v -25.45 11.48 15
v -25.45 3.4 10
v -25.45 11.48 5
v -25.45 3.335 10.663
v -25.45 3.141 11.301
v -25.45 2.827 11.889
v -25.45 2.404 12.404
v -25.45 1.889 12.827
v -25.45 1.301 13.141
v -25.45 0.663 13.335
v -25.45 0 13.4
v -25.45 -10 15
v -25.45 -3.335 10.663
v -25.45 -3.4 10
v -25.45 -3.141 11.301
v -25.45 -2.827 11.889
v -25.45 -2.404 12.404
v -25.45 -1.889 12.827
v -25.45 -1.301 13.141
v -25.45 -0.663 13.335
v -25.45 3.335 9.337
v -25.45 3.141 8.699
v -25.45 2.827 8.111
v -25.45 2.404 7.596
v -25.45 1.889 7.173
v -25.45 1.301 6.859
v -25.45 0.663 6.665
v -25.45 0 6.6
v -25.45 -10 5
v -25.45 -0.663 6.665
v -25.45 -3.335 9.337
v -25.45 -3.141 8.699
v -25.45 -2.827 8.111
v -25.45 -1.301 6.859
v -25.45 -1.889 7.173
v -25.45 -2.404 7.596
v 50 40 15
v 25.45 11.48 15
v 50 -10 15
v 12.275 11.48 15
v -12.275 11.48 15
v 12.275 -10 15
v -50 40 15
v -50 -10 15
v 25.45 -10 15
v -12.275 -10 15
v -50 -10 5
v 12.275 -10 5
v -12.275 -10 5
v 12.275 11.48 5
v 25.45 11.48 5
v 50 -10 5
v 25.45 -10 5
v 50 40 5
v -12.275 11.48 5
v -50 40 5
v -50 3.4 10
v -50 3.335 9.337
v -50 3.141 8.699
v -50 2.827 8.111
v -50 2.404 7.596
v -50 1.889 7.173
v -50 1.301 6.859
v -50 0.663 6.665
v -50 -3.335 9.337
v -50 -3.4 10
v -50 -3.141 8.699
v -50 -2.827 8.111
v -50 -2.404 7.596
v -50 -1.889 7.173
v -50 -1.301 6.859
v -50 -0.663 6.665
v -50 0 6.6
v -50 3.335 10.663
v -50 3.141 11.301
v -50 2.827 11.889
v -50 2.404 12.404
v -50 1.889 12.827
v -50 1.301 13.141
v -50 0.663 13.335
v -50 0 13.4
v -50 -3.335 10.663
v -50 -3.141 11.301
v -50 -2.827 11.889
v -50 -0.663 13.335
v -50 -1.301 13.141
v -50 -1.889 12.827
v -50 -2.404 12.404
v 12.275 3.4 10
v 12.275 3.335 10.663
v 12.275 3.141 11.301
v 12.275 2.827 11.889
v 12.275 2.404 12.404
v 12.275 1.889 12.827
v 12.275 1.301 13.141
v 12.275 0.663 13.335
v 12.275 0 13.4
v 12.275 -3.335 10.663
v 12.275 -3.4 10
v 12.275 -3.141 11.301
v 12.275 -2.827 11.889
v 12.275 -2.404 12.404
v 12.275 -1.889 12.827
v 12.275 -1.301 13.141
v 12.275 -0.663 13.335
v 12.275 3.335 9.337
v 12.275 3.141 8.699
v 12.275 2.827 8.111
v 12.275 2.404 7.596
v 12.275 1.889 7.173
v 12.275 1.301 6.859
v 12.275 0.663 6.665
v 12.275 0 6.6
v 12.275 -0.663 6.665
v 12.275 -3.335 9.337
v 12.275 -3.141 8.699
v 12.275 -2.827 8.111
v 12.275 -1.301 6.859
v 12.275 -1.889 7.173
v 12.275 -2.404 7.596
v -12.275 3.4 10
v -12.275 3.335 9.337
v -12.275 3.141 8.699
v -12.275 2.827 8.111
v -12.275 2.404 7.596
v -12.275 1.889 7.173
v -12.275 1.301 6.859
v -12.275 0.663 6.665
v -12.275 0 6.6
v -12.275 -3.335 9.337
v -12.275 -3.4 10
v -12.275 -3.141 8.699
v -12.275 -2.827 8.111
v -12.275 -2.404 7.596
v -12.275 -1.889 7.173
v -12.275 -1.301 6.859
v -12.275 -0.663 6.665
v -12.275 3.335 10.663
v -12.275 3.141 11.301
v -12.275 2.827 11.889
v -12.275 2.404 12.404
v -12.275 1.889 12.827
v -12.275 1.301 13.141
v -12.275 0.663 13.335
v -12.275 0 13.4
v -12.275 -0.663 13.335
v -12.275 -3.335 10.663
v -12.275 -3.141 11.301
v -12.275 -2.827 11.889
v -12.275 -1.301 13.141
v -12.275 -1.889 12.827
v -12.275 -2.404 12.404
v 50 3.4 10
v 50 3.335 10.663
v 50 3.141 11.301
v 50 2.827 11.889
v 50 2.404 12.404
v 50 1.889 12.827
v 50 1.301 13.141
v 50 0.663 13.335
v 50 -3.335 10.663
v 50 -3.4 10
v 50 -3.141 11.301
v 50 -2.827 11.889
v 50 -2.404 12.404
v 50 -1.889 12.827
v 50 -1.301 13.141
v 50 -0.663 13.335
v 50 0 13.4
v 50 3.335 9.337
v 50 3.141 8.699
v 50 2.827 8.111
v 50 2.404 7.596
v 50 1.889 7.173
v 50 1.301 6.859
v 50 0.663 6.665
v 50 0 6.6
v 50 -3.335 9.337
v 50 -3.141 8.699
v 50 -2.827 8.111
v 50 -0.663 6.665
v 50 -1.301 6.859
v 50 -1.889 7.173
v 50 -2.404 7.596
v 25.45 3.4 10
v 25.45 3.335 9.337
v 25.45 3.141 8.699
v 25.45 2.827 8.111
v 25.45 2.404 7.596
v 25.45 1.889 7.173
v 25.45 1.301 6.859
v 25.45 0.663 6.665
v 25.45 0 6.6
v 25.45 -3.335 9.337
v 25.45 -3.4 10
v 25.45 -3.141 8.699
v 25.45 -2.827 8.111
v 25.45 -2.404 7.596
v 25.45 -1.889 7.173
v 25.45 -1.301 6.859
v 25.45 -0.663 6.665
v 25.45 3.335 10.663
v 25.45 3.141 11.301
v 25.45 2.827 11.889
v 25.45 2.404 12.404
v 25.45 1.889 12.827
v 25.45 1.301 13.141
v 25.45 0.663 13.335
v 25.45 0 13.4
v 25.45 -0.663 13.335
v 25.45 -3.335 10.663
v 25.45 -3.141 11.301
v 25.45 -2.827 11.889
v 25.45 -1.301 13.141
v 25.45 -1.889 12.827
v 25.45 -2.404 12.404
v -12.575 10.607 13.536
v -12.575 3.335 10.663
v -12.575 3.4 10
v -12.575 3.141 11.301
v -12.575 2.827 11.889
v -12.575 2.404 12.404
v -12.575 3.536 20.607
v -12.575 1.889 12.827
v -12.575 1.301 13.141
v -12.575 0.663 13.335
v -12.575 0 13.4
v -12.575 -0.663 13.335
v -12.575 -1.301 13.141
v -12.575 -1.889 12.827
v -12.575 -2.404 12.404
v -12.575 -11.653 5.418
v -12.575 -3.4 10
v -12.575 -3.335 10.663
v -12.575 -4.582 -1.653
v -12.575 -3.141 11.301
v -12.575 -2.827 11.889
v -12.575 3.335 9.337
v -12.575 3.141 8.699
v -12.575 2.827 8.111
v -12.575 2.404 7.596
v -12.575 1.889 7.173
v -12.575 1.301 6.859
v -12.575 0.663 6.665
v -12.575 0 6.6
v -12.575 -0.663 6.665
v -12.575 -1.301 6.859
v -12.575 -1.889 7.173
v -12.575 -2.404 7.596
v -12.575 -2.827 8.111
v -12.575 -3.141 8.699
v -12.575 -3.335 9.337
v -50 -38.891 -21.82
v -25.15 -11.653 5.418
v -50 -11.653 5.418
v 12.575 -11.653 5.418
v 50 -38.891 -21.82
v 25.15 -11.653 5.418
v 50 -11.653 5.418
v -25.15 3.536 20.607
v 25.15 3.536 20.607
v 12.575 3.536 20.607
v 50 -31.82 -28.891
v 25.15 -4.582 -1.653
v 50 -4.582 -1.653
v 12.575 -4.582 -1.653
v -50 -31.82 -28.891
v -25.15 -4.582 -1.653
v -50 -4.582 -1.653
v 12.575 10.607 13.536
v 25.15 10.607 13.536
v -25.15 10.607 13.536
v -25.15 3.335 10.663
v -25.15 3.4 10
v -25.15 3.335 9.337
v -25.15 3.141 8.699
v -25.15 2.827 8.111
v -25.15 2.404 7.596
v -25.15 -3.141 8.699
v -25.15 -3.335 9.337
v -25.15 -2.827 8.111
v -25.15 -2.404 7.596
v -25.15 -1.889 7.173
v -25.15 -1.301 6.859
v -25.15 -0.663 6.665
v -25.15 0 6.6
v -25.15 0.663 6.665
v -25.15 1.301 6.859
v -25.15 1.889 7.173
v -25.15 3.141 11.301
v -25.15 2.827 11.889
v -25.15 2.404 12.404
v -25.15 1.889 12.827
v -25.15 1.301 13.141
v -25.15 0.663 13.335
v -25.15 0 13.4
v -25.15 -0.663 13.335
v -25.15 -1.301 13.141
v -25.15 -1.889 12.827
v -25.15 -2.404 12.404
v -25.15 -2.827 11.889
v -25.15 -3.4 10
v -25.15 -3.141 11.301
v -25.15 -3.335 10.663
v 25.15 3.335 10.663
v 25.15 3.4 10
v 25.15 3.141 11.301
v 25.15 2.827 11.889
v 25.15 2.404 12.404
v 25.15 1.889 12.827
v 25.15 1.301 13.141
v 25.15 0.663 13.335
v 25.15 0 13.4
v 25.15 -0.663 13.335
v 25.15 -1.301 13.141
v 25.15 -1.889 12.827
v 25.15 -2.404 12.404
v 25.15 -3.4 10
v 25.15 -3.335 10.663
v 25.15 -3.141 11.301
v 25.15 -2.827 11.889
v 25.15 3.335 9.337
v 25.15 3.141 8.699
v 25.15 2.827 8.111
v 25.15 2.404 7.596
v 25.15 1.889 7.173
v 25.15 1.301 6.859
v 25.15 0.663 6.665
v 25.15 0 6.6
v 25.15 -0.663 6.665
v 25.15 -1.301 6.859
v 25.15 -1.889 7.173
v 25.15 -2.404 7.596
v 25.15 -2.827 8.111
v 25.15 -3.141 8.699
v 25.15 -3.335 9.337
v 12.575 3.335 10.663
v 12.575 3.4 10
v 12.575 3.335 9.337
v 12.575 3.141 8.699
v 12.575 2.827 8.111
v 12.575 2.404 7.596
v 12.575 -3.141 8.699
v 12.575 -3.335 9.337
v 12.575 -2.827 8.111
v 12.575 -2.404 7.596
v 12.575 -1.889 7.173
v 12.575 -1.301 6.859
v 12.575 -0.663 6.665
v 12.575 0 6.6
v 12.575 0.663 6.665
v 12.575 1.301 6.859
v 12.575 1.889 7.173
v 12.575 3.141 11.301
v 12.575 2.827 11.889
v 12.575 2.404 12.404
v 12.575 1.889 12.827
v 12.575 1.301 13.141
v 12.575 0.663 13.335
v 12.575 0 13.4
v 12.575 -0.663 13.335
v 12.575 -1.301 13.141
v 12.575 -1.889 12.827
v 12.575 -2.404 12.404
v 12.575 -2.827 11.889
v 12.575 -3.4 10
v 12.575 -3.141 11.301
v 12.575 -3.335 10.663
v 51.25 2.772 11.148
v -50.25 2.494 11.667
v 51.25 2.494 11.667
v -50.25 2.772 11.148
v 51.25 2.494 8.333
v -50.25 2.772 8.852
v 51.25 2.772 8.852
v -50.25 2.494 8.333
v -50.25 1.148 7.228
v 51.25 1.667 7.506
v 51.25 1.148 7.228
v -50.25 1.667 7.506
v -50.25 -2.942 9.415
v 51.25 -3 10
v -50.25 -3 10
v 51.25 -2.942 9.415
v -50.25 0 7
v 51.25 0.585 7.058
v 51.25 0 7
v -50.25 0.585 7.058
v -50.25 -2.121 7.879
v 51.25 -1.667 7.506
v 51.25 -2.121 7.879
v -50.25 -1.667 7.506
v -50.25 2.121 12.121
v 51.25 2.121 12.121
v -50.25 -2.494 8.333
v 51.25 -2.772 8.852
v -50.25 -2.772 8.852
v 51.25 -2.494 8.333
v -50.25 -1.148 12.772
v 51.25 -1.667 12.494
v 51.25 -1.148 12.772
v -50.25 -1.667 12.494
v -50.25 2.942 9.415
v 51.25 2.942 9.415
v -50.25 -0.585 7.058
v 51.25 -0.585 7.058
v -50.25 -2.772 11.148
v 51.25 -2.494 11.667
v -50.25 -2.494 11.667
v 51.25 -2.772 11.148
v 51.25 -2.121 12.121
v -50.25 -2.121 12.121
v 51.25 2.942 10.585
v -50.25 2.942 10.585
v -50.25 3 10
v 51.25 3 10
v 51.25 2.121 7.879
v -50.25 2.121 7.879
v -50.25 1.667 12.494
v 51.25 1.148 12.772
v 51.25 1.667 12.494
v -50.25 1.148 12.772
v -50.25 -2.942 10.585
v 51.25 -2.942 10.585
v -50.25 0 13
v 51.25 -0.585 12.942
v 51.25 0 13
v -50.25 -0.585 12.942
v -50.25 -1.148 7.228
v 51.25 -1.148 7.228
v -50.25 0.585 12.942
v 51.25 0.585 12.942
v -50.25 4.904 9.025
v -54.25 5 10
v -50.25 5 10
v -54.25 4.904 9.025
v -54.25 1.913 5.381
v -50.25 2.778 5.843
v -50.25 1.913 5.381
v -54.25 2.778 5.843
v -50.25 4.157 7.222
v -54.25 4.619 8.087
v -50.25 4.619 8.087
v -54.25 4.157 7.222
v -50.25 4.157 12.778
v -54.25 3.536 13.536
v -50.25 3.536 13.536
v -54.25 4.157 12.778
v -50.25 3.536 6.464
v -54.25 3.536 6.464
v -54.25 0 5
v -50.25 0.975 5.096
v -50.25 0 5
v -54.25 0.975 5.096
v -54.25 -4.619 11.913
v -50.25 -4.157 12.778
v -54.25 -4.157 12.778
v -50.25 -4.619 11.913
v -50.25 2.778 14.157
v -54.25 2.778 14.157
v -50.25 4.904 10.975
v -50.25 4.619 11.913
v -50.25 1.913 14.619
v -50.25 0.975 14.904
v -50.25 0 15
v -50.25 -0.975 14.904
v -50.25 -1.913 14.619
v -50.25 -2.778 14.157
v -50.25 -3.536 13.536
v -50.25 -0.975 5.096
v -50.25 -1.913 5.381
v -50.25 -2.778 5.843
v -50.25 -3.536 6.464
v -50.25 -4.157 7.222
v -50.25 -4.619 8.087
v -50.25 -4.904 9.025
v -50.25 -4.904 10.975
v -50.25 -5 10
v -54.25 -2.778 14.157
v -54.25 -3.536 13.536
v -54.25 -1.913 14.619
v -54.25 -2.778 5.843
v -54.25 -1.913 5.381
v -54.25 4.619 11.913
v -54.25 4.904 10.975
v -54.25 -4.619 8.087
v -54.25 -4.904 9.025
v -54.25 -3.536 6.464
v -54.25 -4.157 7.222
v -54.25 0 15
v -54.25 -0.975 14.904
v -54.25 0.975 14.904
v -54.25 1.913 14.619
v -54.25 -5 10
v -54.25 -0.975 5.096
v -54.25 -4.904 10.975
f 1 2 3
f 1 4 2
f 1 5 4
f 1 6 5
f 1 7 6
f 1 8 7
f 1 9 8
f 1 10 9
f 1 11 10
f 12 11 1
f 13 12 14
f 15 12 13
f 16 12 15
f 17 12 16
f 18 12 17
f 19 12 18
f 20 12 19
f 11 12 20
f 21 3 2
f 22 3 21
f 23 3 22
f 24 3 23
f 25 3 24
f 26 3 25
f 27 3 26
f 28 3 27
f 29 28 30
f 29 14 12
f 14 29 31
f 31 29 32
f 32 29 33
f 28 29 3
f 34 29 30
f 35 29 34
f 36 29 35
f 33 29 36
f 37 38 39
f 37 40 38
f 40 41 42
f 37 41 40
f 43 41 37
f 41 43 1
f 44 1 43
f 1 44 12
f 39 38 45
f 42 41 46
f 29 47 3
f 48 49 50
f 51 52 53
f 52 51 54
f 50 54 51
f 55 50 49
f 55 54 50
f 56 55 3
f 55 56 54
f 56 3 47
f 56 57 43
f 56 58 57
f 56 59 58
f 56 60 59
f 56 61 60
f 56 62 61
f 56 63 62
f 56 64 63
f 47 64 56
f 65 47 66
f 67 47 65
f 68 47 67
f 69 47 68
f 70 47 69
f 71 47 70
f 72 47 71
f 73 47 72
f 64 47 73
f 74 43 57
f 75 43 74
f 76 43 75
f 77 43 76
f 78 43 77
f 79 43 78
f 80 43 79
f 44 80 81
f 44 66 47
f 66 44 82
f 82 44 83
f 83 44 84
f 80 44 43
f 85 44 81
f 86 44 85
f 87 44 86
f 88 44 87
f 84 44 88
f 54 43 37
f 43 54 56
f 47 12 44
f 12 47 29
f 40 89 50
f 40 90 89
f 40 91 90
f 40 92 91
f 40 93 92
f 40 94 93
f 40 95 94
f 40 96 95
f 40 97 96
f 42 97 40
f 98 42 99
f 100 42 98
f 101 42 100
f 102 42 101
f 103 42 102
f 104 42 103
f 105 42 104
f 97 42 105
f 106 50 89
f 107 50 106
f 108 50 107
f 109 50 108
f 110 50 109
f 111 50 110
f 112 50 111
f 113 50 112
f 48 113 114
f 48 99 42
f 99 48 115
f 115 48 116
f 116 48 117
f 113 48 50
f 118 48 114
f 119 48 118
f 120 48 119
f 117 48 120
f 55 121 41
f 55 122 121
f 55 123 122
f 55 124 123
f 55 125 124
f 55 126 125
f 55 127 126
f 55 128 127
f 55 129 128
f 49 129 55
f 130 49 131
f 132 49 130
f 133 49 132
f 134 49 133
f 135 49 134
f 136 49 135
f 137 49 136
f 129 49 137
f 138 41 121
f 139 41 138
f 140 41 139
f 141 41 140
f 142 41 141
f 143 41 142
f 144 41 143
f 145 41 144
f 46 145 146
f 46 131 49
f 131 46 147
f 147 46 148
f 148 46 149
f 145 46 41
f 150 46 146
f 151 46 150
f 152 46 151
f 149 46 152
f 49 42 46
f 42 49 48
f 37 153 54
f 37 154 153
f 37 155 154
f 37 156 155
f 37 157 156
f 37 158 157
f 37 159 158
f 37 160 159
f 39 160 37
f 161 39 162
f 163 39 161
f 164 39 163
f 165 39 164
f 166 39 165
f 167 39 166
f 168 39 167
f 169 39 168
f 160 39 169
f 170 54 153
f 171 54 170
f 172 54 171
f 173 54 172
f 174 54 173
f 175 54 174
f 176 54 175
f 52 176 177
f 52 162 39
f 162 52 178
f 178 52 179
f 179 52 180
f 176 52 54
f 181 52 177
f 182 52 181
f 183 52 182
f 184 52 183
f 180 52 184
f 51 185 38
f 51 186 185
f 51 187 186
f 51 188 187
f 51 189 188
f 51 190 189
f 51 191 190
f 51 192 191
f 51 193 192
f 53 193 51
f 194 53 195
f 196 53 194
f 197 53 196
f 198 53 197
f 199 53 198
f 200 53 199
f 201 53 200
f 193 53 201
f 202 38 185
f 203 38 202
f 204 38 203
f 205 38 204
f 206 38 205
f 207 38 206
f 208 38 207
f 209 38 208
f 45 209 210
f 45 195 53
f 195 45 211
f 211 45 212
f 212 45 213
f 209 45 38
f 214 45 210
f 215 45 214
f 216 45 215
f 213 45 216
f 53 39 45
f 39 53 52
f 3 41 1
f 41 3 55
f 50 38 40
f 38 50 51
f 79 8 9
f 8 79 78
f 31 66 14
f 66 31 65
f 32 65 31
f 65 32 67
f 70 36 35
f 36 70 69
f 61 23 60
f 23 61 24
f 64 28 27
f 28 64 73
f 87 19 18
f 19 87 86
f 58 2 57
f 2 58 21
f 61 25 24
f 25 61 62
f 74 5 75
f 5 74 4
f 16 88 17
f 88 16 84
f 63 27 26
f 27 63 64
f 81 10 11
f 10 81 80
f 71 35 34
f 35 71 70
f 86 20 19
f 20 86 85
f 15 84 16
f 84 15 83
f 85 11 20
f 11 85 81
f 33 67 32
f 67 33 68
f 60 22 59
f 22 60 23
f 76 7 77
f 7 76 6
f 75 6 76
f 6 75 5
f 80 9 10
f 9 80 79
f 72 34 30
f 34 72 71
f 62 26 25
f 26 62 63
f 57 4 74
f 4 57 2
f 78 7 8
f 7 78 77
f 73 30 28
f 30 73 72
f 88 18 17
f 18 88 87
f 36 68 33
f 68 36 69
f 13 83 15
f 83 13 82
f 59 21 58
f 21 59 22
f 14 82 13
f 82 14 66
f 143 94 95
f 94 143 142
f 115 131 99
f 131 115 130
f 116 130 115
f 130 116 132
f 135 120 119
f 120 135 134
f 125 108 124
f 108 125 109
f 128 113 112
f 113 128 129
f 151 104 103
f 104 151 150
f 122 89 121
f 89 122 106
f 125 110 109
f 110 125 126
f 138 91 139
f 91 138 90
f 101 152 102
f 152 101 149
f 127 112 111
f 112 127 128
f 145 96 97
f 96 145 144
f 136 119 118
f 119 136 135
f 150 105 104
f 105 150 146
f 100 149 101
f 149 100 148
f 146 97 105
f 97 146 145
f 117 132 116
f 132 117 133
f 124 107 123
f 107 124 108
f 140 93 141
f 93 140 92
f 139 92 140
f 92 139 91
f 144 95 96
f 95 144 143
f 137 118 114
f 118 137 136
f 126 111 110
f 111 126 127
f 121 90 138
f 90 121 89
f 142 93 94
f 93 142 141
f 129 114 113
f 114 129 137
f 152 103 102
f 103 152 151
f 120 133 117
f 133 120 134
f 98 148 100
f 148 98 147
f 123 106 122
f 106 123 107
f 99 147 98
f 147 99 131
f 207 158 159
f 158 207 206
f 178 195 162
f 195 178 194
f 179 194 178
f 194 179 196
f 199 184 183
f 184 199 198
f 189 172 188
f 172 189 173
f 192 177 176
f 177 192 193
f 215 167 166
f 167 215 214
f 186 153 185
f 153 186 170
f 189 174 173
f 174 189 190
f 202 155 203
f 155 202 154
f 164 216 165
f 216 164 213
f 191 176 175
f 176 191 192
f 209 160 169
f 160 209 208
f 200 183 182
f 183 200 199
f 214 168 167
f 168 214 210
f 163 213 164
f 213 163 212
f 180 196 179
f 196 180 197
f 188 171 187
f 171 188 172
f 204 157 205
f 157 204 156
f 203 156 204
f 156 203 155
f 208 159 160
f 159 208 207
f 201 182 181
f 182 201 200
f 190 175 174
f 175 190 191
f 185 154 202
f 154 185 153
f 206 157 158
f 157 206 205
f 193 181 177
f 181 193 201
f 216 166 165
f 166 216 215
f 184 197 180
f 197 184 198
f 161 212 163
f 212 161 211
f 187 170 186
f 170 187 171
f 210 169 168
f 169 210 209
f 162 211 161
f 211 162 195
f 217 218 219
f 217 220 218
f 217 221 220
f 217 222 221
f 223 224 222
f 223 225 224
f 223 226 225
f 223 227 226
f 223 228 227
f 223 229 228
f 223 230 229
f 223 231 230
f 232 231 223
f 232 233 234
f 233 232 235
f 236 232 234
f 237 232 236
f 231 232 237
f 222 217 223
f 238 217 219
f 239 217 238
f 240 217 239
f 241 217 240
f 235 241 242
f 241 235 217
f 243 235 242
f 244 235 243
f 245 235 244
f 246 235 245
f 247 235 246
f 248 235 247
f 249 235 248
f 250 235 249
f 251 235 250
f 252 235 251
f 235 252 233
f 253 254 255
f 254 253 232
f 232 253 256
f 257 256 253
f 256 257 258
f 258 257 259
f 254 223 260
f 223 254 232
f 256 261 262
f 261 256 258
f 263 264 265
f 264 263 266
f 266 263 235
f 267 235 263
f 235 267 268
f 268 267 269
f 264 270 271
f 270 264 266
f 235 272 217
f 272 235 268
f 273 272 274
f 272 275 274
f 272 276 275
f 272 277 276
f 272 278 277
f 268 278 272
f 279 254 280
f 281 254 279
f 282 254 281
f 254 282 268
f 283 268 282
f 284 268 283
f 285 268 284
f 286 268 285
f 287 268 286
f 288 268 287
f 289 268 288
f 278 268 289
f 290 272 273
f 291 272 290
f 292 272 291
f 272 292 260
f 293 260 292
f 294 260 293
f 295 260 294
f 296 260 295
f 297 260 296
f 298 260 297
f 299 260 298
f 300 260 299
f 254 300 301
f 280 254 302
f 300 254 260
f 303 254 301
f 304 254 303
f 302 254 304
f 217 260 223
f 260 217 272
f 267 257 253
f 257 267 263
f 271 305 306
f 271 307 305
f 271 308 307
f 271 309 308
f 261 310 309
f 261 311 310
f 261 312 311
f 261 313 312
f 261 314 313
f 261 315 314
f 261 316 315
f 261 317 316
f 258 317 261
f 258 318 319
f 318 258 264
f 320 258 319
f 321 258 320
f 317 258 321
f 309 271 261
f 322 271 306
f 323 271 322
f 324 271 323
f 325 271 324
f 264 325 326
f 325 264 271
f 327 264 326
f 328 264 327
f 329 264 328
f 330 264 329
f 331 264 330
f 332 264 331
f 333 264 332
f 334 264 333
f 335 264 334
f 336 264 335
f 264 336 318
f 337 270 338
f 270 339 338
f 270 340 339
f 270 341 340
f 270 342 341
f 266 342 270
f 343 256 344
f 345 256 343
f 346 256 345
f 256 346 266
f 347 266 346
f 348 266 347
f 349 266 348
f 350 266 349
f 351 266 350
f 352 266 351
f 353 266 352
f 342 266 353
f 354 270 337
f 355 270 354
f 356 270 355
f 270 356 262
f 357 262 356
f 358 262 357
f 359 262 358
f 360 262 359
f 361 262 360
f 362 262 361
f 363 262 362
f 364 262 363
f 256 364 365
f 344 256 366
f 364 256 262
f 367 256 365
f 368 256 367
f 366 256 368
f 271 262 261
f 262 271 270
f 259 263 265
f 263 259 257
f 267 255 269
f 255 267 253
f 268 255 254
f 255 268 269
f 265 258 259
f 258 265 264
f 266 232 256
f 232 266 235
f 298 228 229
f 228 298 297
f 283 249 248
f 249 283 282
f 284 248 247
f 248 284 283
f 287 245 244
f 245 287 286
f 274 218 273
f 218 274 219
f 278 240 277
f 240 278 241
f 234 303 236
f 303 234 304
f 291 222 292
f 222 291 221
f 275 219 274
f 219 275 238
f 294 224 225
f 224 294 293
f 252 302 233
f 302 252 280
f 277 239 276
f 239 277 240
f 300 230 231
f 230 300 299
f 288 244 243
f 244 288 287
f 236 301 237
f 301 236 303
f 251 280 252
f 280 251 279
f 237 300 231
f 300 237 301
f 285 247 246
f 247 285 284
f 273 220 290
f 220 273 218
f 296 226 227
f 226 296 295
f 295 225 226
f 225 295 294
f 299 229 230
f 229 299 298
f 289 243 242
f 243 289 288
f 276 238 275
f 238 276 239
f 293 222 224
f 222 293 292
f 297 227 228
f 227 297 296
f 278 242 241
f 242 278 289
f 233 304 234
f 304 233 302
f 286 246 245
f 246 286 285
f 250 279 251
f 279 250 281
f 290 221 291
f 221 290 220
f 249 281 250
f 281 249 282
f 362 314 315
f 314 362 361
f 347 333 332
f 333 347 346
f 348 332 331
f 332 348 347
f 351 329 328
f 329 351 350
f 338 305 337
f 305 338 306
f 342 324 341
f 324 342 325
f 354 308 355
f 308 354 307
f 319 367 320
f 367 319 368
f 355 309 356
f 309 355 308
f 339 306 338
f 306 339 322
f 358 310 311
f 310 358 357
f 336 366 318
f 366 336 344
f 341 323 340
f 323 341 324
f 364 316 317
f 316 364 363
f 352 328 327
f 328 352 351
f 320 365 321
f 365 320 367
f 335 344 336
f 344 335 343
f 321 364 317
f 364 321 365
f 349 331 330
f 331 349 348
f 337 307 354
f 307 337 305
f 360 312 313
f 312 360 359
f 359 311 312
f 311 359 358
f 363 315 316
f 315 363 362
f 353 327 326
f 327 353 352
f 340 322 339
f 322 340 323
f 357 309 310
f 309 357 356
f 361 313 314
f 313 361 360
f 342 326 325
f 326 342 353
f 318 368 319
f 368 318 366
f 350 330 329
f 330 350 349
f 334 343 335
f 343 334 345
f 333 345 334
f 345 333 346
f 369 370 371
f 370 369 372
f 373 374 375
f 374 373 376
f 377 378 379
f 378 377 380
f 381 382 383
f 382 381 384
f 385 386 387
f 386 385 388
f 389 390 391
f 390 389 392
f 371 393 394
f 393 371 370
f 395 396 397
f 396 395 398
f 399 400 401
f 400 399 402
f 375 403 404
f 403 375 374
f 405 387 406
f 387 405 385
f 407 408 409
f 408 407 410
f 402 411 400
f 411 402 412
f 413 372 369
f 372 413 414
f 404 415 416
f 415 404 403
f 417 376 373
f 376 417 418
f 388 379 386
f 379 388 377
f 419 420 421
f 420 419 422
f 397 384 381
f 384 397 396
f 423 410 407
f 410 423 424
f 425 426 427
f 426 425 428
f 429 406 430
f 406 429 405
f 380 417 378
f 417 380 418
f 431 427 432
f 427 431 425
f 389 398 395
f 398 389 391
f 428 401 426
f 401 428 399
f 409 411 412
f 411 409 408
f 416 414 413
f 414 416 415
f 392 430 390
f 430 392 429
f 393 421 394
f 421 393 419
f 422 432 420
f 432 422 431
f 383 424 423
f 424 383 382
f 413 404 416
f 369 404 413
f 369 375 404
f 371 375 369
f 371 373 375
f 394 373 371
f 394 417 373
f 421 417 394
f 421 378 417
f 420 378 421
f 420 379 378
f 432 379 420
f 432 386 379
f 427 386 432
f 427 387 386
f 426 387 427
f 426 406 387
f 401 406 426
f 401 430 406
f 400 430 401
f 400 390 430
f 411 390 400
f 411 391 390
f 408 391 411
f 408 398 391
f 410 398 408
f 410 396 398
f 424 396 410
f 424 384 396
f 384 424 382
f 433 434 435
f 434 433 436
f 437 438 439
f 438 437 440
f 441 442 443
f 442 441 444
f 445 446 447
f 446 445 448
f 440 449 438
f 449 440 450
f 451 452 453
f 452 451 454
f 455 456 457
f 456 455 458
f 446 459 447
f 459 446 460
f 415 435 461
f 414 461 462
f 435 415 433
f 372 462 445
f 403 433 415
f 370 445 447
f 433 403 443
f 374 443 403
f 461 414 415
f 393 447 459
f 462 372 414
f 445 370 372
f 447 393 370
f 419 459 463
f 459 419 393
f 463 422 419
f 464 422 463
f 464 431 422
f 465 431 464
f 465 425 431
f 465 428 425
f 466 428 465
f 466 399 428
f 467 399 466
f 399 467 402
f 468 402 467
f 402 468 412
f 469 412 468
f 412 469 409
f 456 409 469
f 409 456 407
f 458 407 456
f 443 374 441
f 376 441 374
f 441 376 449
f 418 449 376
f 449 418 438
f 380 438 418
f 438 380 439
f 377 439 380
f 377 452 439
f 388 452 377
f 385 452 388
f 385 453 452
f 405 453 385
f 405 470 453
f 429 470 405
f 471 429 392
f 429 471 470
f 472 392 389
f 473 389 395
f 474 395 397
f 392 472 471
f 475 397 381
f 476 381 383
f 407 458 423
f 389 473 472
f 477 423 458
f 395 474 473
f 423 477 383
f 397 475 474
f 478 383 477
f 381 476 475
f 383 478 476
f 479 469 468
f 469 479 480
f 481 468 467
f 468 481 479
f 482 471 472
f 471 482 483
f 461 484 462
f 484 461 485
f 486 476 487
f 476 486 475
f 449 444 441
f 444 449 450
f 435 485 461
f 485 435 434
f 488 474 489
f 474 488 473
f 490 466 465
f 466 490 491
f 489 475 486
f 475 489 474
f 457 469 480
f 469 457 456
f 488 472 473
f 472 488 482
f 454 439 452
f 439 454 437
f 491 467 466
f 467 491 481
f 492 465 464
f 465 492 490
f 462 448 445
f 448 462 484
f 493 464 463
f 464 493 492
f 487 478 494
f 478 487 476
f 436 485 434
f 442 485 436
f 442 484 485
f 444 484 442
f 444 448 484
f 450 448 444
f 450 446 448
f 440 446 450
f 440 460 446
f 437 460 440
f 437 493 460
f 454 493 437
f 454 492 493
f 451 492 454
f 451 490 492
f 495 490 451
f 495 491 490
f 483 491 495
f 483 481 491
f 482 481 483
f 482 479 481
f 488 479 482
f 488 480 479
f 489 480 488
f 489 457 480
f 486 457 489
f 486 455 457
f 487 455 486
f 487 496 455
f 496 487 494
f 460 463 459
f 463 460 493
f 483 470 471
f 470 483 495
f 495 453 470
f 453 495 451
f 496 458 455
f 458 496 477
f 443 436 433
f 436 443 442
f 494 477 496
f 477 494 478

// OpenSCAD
$fn = 32;

// ------------------------------------------------------------------------
// Butt hinge: hinge 100 mm, leaf swung 45 deg
// Every part is its own module, assembly() places every instance.
// ------------------------------------------------------------------------

// --- part 1 ---
module hinge_base() {
  difference() {
    union() {
      translate([-50, -10, -5]) cube([24.55, 50, 10]);
      translate([-12.275, -10, -5]) cube([24.55, 50, 10]);
      translate([25.45, -10, -5]) cube([24.55, 50, 10]);
      translate([-50, 11.48, -5]) cube([100, 28.52, 10]);
    }
    translate([-37.725, 0, 0]) rotate([0, 90, 0]) cylinder(h = 26.55, d = 6.8, center = true);
    translate([0, 0, 0]) rotate([0, 90, 0]) cylinder(h = 26.55, d = 6.8, center = true);
    translate([37.725, 0, 0]) rotate([0, 90, 0]) cylinder(h = 26.55, d = 6.8, center = true);
  }
}

// --- part 2 ---
module hinge_mover() {
  difference() {
    union() {
      translate([-25.15, -50, -5]) cube([12.575, 60, 10]);
      translate([12.575, -50, -5]) cube([12.575, 60, 10]);
      translate([-50, -50, -5]) cube([100, 38.52, 10]);
    }
    translate([-18.863, 0, 0]) rotate([0, 90, 0]) cylinder(h = 14.575, d = 6.8, center = true);
    translate([18.863, 0, 0]) rotate([0, 90, 0]) cylinder(h = 14.575, d = 6.8, center = true);
  }
}

// --- part 3 ---
module hinge_pin() {
  rotate([0, 90, 0]) cylinder(h = 102.5, d = 6, center = true);
  translate([-54.25, 0, 0]) rotate([0, 90, 0]) cylinder(h = 4, d = 10);
}

// --- assembly ---
module assembly() {
  color([0.80, 0.24, 0.20]) translate([0, 0, 10]) rotate([0, 0, 0]) hinge_base();
  color([0.20, 0.45, 0.75]) translate([0, 0, 10]) rotate([45, 0, 0]) hinge_mover();
  color([0.25, 0.62, 0.32]) translate([0, 0, 10]) rotate([0, 0, 0]) hinge_pin();
}

assembly();
